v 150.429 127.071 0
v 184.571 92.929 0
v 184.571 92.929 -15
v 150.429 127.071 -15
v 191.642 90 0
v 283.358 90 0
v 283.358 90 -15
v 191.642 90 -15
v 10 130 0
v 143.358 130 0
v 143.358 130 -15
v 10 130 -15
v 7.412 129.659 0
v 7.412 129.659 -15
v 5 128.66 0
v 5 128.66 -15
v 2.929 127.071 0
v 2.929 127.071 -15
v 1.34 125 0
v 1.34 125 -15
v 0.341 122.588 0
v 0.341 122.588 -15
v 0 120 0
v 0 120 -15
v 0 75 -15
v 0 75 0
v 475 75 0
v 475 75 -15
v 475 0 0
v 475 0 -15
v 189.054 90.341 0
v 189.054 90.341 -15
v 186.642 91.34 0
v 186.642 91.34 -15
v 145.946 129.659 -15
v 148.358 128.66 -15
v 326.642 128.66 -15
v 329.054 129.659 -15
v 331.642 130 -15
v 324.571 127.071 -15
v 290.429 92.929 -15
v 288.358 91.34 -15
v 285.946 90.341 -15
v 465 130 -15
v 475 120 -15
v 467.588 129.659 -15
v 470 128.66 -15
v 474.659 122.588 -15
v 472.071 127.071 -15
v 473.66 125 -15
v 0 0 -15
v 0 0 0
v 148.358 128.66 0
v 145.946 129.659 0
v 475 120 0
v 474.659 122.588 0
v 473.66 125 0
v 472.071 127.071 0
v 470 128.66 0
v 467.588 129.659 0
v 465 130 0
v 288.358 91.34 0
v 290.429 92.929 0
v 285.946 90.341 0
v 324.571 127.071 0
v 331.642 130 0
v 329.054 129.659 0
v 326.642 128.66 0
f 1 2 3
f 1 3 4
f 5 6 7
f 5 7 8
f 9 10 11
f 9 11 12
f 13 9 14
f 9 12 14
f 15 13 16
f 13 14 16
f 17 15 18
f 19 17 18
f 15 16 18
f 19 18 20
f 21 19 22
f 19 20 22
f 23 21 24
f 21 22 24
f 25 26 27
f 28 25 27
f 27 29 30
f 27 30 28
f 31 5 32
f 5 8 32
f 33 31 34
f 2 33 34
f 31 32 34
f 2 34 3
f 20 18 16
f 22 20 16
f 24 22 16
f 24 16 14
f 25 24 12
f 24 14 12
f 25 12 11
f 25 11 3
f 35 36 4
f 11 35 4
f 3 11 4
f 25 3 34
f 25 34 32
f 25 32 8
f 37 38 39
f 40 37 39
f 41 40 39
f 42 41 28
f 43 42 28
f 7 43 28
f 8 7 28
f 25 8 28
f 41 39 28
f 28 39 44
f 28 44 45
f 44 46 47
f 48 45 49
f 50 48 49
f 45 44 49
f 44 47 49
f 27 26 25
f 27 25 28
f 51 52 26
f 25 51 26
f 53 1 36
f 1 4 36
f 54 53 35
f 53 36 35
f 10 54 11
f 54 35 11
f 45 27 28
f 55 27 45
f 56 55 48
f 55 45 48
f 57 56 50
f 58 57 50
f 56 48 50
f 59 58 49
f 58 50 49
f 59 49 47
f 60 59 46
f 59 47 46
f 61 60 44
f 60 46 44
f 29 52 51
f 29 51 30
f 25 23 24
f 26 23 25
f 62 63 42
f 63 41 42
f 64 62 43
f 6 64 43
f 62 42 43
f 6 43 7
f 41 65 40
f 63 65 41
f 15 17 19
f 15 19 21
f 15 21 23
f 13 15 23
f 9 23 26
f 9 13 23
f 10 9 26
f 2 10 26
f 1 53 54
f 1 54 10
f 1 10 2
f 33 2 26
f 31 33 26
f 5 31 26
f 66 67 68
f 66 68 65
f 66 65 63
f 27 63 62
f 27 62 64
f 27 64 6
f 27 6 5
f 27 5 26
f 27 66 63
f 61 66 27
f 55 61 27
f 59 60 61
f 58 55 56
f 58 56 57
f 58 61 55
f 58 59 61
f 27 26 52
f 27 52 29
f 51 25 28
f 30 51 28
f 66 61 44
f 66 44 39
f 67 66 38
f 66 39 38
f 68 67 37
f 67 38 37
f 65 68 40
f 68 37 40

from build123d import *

# Parameters (mm, degrees)
SKETCH1_W           = 47.5
SKETCH1_H           = 7.5
BOSS_EXTRUDE1_DEPTH = 1.5
BOSS_EXTRUDE2_DEPTH = 1.5
FILLET1_R           = 1
SCALE1_SCALE        = 10


with BuildPart() as part:
    # Sketch1 → Boss-Extrude1 (new body)
    with BuildSketch(Plane.XY):
        with Locations((23.75, 3.75)):
            Rectangle(SKETCH1_W, SKETCH1_H)
    extrude(amount=-BOSS_EXTRUDE1_DEPTH)


with BuildPart() as body_2:
    # Sketch2 → Boss-Extrude2 (new body)
    with BuildSketch(Plane.XY):
        Polygon((0, 7.5), (47.5, 7.5), (47.5, 13), (32.75, 13), (28.75, 9), (18.75, 9), (14.75, 13), (0, 13), align=None)
    extrude(amount=-BOSS_EXTRUDE2_DEPTH)

    # Fillet1
    fillet1_edges = [body_2.edges().sort_by_distance(p)[0] for p in [
        (0, 13, -0.75),
        (14.75, 13, -0.75),
        (18.75, 9, -0.75),
        (28.75, 9, -0.75),
        (32.75, 13, -0.75),
        (47.5, 13, -0.75),
    ]]
    fillet(fillet1_edges, radius=FILLET1_R)


with BuildPart() as part_1:
    # Scale1: scaled about (0, 0, 0)
    add(part.part.scale(SCALE1_SCALE))


with BuildPart() as body_2_1:
    # Scale1: scaled about (0, 0, 0)
    add(body_2.part.scale(SCALE1_SCALE))


solid = Compound([part_1.part, body_2_1.part])
